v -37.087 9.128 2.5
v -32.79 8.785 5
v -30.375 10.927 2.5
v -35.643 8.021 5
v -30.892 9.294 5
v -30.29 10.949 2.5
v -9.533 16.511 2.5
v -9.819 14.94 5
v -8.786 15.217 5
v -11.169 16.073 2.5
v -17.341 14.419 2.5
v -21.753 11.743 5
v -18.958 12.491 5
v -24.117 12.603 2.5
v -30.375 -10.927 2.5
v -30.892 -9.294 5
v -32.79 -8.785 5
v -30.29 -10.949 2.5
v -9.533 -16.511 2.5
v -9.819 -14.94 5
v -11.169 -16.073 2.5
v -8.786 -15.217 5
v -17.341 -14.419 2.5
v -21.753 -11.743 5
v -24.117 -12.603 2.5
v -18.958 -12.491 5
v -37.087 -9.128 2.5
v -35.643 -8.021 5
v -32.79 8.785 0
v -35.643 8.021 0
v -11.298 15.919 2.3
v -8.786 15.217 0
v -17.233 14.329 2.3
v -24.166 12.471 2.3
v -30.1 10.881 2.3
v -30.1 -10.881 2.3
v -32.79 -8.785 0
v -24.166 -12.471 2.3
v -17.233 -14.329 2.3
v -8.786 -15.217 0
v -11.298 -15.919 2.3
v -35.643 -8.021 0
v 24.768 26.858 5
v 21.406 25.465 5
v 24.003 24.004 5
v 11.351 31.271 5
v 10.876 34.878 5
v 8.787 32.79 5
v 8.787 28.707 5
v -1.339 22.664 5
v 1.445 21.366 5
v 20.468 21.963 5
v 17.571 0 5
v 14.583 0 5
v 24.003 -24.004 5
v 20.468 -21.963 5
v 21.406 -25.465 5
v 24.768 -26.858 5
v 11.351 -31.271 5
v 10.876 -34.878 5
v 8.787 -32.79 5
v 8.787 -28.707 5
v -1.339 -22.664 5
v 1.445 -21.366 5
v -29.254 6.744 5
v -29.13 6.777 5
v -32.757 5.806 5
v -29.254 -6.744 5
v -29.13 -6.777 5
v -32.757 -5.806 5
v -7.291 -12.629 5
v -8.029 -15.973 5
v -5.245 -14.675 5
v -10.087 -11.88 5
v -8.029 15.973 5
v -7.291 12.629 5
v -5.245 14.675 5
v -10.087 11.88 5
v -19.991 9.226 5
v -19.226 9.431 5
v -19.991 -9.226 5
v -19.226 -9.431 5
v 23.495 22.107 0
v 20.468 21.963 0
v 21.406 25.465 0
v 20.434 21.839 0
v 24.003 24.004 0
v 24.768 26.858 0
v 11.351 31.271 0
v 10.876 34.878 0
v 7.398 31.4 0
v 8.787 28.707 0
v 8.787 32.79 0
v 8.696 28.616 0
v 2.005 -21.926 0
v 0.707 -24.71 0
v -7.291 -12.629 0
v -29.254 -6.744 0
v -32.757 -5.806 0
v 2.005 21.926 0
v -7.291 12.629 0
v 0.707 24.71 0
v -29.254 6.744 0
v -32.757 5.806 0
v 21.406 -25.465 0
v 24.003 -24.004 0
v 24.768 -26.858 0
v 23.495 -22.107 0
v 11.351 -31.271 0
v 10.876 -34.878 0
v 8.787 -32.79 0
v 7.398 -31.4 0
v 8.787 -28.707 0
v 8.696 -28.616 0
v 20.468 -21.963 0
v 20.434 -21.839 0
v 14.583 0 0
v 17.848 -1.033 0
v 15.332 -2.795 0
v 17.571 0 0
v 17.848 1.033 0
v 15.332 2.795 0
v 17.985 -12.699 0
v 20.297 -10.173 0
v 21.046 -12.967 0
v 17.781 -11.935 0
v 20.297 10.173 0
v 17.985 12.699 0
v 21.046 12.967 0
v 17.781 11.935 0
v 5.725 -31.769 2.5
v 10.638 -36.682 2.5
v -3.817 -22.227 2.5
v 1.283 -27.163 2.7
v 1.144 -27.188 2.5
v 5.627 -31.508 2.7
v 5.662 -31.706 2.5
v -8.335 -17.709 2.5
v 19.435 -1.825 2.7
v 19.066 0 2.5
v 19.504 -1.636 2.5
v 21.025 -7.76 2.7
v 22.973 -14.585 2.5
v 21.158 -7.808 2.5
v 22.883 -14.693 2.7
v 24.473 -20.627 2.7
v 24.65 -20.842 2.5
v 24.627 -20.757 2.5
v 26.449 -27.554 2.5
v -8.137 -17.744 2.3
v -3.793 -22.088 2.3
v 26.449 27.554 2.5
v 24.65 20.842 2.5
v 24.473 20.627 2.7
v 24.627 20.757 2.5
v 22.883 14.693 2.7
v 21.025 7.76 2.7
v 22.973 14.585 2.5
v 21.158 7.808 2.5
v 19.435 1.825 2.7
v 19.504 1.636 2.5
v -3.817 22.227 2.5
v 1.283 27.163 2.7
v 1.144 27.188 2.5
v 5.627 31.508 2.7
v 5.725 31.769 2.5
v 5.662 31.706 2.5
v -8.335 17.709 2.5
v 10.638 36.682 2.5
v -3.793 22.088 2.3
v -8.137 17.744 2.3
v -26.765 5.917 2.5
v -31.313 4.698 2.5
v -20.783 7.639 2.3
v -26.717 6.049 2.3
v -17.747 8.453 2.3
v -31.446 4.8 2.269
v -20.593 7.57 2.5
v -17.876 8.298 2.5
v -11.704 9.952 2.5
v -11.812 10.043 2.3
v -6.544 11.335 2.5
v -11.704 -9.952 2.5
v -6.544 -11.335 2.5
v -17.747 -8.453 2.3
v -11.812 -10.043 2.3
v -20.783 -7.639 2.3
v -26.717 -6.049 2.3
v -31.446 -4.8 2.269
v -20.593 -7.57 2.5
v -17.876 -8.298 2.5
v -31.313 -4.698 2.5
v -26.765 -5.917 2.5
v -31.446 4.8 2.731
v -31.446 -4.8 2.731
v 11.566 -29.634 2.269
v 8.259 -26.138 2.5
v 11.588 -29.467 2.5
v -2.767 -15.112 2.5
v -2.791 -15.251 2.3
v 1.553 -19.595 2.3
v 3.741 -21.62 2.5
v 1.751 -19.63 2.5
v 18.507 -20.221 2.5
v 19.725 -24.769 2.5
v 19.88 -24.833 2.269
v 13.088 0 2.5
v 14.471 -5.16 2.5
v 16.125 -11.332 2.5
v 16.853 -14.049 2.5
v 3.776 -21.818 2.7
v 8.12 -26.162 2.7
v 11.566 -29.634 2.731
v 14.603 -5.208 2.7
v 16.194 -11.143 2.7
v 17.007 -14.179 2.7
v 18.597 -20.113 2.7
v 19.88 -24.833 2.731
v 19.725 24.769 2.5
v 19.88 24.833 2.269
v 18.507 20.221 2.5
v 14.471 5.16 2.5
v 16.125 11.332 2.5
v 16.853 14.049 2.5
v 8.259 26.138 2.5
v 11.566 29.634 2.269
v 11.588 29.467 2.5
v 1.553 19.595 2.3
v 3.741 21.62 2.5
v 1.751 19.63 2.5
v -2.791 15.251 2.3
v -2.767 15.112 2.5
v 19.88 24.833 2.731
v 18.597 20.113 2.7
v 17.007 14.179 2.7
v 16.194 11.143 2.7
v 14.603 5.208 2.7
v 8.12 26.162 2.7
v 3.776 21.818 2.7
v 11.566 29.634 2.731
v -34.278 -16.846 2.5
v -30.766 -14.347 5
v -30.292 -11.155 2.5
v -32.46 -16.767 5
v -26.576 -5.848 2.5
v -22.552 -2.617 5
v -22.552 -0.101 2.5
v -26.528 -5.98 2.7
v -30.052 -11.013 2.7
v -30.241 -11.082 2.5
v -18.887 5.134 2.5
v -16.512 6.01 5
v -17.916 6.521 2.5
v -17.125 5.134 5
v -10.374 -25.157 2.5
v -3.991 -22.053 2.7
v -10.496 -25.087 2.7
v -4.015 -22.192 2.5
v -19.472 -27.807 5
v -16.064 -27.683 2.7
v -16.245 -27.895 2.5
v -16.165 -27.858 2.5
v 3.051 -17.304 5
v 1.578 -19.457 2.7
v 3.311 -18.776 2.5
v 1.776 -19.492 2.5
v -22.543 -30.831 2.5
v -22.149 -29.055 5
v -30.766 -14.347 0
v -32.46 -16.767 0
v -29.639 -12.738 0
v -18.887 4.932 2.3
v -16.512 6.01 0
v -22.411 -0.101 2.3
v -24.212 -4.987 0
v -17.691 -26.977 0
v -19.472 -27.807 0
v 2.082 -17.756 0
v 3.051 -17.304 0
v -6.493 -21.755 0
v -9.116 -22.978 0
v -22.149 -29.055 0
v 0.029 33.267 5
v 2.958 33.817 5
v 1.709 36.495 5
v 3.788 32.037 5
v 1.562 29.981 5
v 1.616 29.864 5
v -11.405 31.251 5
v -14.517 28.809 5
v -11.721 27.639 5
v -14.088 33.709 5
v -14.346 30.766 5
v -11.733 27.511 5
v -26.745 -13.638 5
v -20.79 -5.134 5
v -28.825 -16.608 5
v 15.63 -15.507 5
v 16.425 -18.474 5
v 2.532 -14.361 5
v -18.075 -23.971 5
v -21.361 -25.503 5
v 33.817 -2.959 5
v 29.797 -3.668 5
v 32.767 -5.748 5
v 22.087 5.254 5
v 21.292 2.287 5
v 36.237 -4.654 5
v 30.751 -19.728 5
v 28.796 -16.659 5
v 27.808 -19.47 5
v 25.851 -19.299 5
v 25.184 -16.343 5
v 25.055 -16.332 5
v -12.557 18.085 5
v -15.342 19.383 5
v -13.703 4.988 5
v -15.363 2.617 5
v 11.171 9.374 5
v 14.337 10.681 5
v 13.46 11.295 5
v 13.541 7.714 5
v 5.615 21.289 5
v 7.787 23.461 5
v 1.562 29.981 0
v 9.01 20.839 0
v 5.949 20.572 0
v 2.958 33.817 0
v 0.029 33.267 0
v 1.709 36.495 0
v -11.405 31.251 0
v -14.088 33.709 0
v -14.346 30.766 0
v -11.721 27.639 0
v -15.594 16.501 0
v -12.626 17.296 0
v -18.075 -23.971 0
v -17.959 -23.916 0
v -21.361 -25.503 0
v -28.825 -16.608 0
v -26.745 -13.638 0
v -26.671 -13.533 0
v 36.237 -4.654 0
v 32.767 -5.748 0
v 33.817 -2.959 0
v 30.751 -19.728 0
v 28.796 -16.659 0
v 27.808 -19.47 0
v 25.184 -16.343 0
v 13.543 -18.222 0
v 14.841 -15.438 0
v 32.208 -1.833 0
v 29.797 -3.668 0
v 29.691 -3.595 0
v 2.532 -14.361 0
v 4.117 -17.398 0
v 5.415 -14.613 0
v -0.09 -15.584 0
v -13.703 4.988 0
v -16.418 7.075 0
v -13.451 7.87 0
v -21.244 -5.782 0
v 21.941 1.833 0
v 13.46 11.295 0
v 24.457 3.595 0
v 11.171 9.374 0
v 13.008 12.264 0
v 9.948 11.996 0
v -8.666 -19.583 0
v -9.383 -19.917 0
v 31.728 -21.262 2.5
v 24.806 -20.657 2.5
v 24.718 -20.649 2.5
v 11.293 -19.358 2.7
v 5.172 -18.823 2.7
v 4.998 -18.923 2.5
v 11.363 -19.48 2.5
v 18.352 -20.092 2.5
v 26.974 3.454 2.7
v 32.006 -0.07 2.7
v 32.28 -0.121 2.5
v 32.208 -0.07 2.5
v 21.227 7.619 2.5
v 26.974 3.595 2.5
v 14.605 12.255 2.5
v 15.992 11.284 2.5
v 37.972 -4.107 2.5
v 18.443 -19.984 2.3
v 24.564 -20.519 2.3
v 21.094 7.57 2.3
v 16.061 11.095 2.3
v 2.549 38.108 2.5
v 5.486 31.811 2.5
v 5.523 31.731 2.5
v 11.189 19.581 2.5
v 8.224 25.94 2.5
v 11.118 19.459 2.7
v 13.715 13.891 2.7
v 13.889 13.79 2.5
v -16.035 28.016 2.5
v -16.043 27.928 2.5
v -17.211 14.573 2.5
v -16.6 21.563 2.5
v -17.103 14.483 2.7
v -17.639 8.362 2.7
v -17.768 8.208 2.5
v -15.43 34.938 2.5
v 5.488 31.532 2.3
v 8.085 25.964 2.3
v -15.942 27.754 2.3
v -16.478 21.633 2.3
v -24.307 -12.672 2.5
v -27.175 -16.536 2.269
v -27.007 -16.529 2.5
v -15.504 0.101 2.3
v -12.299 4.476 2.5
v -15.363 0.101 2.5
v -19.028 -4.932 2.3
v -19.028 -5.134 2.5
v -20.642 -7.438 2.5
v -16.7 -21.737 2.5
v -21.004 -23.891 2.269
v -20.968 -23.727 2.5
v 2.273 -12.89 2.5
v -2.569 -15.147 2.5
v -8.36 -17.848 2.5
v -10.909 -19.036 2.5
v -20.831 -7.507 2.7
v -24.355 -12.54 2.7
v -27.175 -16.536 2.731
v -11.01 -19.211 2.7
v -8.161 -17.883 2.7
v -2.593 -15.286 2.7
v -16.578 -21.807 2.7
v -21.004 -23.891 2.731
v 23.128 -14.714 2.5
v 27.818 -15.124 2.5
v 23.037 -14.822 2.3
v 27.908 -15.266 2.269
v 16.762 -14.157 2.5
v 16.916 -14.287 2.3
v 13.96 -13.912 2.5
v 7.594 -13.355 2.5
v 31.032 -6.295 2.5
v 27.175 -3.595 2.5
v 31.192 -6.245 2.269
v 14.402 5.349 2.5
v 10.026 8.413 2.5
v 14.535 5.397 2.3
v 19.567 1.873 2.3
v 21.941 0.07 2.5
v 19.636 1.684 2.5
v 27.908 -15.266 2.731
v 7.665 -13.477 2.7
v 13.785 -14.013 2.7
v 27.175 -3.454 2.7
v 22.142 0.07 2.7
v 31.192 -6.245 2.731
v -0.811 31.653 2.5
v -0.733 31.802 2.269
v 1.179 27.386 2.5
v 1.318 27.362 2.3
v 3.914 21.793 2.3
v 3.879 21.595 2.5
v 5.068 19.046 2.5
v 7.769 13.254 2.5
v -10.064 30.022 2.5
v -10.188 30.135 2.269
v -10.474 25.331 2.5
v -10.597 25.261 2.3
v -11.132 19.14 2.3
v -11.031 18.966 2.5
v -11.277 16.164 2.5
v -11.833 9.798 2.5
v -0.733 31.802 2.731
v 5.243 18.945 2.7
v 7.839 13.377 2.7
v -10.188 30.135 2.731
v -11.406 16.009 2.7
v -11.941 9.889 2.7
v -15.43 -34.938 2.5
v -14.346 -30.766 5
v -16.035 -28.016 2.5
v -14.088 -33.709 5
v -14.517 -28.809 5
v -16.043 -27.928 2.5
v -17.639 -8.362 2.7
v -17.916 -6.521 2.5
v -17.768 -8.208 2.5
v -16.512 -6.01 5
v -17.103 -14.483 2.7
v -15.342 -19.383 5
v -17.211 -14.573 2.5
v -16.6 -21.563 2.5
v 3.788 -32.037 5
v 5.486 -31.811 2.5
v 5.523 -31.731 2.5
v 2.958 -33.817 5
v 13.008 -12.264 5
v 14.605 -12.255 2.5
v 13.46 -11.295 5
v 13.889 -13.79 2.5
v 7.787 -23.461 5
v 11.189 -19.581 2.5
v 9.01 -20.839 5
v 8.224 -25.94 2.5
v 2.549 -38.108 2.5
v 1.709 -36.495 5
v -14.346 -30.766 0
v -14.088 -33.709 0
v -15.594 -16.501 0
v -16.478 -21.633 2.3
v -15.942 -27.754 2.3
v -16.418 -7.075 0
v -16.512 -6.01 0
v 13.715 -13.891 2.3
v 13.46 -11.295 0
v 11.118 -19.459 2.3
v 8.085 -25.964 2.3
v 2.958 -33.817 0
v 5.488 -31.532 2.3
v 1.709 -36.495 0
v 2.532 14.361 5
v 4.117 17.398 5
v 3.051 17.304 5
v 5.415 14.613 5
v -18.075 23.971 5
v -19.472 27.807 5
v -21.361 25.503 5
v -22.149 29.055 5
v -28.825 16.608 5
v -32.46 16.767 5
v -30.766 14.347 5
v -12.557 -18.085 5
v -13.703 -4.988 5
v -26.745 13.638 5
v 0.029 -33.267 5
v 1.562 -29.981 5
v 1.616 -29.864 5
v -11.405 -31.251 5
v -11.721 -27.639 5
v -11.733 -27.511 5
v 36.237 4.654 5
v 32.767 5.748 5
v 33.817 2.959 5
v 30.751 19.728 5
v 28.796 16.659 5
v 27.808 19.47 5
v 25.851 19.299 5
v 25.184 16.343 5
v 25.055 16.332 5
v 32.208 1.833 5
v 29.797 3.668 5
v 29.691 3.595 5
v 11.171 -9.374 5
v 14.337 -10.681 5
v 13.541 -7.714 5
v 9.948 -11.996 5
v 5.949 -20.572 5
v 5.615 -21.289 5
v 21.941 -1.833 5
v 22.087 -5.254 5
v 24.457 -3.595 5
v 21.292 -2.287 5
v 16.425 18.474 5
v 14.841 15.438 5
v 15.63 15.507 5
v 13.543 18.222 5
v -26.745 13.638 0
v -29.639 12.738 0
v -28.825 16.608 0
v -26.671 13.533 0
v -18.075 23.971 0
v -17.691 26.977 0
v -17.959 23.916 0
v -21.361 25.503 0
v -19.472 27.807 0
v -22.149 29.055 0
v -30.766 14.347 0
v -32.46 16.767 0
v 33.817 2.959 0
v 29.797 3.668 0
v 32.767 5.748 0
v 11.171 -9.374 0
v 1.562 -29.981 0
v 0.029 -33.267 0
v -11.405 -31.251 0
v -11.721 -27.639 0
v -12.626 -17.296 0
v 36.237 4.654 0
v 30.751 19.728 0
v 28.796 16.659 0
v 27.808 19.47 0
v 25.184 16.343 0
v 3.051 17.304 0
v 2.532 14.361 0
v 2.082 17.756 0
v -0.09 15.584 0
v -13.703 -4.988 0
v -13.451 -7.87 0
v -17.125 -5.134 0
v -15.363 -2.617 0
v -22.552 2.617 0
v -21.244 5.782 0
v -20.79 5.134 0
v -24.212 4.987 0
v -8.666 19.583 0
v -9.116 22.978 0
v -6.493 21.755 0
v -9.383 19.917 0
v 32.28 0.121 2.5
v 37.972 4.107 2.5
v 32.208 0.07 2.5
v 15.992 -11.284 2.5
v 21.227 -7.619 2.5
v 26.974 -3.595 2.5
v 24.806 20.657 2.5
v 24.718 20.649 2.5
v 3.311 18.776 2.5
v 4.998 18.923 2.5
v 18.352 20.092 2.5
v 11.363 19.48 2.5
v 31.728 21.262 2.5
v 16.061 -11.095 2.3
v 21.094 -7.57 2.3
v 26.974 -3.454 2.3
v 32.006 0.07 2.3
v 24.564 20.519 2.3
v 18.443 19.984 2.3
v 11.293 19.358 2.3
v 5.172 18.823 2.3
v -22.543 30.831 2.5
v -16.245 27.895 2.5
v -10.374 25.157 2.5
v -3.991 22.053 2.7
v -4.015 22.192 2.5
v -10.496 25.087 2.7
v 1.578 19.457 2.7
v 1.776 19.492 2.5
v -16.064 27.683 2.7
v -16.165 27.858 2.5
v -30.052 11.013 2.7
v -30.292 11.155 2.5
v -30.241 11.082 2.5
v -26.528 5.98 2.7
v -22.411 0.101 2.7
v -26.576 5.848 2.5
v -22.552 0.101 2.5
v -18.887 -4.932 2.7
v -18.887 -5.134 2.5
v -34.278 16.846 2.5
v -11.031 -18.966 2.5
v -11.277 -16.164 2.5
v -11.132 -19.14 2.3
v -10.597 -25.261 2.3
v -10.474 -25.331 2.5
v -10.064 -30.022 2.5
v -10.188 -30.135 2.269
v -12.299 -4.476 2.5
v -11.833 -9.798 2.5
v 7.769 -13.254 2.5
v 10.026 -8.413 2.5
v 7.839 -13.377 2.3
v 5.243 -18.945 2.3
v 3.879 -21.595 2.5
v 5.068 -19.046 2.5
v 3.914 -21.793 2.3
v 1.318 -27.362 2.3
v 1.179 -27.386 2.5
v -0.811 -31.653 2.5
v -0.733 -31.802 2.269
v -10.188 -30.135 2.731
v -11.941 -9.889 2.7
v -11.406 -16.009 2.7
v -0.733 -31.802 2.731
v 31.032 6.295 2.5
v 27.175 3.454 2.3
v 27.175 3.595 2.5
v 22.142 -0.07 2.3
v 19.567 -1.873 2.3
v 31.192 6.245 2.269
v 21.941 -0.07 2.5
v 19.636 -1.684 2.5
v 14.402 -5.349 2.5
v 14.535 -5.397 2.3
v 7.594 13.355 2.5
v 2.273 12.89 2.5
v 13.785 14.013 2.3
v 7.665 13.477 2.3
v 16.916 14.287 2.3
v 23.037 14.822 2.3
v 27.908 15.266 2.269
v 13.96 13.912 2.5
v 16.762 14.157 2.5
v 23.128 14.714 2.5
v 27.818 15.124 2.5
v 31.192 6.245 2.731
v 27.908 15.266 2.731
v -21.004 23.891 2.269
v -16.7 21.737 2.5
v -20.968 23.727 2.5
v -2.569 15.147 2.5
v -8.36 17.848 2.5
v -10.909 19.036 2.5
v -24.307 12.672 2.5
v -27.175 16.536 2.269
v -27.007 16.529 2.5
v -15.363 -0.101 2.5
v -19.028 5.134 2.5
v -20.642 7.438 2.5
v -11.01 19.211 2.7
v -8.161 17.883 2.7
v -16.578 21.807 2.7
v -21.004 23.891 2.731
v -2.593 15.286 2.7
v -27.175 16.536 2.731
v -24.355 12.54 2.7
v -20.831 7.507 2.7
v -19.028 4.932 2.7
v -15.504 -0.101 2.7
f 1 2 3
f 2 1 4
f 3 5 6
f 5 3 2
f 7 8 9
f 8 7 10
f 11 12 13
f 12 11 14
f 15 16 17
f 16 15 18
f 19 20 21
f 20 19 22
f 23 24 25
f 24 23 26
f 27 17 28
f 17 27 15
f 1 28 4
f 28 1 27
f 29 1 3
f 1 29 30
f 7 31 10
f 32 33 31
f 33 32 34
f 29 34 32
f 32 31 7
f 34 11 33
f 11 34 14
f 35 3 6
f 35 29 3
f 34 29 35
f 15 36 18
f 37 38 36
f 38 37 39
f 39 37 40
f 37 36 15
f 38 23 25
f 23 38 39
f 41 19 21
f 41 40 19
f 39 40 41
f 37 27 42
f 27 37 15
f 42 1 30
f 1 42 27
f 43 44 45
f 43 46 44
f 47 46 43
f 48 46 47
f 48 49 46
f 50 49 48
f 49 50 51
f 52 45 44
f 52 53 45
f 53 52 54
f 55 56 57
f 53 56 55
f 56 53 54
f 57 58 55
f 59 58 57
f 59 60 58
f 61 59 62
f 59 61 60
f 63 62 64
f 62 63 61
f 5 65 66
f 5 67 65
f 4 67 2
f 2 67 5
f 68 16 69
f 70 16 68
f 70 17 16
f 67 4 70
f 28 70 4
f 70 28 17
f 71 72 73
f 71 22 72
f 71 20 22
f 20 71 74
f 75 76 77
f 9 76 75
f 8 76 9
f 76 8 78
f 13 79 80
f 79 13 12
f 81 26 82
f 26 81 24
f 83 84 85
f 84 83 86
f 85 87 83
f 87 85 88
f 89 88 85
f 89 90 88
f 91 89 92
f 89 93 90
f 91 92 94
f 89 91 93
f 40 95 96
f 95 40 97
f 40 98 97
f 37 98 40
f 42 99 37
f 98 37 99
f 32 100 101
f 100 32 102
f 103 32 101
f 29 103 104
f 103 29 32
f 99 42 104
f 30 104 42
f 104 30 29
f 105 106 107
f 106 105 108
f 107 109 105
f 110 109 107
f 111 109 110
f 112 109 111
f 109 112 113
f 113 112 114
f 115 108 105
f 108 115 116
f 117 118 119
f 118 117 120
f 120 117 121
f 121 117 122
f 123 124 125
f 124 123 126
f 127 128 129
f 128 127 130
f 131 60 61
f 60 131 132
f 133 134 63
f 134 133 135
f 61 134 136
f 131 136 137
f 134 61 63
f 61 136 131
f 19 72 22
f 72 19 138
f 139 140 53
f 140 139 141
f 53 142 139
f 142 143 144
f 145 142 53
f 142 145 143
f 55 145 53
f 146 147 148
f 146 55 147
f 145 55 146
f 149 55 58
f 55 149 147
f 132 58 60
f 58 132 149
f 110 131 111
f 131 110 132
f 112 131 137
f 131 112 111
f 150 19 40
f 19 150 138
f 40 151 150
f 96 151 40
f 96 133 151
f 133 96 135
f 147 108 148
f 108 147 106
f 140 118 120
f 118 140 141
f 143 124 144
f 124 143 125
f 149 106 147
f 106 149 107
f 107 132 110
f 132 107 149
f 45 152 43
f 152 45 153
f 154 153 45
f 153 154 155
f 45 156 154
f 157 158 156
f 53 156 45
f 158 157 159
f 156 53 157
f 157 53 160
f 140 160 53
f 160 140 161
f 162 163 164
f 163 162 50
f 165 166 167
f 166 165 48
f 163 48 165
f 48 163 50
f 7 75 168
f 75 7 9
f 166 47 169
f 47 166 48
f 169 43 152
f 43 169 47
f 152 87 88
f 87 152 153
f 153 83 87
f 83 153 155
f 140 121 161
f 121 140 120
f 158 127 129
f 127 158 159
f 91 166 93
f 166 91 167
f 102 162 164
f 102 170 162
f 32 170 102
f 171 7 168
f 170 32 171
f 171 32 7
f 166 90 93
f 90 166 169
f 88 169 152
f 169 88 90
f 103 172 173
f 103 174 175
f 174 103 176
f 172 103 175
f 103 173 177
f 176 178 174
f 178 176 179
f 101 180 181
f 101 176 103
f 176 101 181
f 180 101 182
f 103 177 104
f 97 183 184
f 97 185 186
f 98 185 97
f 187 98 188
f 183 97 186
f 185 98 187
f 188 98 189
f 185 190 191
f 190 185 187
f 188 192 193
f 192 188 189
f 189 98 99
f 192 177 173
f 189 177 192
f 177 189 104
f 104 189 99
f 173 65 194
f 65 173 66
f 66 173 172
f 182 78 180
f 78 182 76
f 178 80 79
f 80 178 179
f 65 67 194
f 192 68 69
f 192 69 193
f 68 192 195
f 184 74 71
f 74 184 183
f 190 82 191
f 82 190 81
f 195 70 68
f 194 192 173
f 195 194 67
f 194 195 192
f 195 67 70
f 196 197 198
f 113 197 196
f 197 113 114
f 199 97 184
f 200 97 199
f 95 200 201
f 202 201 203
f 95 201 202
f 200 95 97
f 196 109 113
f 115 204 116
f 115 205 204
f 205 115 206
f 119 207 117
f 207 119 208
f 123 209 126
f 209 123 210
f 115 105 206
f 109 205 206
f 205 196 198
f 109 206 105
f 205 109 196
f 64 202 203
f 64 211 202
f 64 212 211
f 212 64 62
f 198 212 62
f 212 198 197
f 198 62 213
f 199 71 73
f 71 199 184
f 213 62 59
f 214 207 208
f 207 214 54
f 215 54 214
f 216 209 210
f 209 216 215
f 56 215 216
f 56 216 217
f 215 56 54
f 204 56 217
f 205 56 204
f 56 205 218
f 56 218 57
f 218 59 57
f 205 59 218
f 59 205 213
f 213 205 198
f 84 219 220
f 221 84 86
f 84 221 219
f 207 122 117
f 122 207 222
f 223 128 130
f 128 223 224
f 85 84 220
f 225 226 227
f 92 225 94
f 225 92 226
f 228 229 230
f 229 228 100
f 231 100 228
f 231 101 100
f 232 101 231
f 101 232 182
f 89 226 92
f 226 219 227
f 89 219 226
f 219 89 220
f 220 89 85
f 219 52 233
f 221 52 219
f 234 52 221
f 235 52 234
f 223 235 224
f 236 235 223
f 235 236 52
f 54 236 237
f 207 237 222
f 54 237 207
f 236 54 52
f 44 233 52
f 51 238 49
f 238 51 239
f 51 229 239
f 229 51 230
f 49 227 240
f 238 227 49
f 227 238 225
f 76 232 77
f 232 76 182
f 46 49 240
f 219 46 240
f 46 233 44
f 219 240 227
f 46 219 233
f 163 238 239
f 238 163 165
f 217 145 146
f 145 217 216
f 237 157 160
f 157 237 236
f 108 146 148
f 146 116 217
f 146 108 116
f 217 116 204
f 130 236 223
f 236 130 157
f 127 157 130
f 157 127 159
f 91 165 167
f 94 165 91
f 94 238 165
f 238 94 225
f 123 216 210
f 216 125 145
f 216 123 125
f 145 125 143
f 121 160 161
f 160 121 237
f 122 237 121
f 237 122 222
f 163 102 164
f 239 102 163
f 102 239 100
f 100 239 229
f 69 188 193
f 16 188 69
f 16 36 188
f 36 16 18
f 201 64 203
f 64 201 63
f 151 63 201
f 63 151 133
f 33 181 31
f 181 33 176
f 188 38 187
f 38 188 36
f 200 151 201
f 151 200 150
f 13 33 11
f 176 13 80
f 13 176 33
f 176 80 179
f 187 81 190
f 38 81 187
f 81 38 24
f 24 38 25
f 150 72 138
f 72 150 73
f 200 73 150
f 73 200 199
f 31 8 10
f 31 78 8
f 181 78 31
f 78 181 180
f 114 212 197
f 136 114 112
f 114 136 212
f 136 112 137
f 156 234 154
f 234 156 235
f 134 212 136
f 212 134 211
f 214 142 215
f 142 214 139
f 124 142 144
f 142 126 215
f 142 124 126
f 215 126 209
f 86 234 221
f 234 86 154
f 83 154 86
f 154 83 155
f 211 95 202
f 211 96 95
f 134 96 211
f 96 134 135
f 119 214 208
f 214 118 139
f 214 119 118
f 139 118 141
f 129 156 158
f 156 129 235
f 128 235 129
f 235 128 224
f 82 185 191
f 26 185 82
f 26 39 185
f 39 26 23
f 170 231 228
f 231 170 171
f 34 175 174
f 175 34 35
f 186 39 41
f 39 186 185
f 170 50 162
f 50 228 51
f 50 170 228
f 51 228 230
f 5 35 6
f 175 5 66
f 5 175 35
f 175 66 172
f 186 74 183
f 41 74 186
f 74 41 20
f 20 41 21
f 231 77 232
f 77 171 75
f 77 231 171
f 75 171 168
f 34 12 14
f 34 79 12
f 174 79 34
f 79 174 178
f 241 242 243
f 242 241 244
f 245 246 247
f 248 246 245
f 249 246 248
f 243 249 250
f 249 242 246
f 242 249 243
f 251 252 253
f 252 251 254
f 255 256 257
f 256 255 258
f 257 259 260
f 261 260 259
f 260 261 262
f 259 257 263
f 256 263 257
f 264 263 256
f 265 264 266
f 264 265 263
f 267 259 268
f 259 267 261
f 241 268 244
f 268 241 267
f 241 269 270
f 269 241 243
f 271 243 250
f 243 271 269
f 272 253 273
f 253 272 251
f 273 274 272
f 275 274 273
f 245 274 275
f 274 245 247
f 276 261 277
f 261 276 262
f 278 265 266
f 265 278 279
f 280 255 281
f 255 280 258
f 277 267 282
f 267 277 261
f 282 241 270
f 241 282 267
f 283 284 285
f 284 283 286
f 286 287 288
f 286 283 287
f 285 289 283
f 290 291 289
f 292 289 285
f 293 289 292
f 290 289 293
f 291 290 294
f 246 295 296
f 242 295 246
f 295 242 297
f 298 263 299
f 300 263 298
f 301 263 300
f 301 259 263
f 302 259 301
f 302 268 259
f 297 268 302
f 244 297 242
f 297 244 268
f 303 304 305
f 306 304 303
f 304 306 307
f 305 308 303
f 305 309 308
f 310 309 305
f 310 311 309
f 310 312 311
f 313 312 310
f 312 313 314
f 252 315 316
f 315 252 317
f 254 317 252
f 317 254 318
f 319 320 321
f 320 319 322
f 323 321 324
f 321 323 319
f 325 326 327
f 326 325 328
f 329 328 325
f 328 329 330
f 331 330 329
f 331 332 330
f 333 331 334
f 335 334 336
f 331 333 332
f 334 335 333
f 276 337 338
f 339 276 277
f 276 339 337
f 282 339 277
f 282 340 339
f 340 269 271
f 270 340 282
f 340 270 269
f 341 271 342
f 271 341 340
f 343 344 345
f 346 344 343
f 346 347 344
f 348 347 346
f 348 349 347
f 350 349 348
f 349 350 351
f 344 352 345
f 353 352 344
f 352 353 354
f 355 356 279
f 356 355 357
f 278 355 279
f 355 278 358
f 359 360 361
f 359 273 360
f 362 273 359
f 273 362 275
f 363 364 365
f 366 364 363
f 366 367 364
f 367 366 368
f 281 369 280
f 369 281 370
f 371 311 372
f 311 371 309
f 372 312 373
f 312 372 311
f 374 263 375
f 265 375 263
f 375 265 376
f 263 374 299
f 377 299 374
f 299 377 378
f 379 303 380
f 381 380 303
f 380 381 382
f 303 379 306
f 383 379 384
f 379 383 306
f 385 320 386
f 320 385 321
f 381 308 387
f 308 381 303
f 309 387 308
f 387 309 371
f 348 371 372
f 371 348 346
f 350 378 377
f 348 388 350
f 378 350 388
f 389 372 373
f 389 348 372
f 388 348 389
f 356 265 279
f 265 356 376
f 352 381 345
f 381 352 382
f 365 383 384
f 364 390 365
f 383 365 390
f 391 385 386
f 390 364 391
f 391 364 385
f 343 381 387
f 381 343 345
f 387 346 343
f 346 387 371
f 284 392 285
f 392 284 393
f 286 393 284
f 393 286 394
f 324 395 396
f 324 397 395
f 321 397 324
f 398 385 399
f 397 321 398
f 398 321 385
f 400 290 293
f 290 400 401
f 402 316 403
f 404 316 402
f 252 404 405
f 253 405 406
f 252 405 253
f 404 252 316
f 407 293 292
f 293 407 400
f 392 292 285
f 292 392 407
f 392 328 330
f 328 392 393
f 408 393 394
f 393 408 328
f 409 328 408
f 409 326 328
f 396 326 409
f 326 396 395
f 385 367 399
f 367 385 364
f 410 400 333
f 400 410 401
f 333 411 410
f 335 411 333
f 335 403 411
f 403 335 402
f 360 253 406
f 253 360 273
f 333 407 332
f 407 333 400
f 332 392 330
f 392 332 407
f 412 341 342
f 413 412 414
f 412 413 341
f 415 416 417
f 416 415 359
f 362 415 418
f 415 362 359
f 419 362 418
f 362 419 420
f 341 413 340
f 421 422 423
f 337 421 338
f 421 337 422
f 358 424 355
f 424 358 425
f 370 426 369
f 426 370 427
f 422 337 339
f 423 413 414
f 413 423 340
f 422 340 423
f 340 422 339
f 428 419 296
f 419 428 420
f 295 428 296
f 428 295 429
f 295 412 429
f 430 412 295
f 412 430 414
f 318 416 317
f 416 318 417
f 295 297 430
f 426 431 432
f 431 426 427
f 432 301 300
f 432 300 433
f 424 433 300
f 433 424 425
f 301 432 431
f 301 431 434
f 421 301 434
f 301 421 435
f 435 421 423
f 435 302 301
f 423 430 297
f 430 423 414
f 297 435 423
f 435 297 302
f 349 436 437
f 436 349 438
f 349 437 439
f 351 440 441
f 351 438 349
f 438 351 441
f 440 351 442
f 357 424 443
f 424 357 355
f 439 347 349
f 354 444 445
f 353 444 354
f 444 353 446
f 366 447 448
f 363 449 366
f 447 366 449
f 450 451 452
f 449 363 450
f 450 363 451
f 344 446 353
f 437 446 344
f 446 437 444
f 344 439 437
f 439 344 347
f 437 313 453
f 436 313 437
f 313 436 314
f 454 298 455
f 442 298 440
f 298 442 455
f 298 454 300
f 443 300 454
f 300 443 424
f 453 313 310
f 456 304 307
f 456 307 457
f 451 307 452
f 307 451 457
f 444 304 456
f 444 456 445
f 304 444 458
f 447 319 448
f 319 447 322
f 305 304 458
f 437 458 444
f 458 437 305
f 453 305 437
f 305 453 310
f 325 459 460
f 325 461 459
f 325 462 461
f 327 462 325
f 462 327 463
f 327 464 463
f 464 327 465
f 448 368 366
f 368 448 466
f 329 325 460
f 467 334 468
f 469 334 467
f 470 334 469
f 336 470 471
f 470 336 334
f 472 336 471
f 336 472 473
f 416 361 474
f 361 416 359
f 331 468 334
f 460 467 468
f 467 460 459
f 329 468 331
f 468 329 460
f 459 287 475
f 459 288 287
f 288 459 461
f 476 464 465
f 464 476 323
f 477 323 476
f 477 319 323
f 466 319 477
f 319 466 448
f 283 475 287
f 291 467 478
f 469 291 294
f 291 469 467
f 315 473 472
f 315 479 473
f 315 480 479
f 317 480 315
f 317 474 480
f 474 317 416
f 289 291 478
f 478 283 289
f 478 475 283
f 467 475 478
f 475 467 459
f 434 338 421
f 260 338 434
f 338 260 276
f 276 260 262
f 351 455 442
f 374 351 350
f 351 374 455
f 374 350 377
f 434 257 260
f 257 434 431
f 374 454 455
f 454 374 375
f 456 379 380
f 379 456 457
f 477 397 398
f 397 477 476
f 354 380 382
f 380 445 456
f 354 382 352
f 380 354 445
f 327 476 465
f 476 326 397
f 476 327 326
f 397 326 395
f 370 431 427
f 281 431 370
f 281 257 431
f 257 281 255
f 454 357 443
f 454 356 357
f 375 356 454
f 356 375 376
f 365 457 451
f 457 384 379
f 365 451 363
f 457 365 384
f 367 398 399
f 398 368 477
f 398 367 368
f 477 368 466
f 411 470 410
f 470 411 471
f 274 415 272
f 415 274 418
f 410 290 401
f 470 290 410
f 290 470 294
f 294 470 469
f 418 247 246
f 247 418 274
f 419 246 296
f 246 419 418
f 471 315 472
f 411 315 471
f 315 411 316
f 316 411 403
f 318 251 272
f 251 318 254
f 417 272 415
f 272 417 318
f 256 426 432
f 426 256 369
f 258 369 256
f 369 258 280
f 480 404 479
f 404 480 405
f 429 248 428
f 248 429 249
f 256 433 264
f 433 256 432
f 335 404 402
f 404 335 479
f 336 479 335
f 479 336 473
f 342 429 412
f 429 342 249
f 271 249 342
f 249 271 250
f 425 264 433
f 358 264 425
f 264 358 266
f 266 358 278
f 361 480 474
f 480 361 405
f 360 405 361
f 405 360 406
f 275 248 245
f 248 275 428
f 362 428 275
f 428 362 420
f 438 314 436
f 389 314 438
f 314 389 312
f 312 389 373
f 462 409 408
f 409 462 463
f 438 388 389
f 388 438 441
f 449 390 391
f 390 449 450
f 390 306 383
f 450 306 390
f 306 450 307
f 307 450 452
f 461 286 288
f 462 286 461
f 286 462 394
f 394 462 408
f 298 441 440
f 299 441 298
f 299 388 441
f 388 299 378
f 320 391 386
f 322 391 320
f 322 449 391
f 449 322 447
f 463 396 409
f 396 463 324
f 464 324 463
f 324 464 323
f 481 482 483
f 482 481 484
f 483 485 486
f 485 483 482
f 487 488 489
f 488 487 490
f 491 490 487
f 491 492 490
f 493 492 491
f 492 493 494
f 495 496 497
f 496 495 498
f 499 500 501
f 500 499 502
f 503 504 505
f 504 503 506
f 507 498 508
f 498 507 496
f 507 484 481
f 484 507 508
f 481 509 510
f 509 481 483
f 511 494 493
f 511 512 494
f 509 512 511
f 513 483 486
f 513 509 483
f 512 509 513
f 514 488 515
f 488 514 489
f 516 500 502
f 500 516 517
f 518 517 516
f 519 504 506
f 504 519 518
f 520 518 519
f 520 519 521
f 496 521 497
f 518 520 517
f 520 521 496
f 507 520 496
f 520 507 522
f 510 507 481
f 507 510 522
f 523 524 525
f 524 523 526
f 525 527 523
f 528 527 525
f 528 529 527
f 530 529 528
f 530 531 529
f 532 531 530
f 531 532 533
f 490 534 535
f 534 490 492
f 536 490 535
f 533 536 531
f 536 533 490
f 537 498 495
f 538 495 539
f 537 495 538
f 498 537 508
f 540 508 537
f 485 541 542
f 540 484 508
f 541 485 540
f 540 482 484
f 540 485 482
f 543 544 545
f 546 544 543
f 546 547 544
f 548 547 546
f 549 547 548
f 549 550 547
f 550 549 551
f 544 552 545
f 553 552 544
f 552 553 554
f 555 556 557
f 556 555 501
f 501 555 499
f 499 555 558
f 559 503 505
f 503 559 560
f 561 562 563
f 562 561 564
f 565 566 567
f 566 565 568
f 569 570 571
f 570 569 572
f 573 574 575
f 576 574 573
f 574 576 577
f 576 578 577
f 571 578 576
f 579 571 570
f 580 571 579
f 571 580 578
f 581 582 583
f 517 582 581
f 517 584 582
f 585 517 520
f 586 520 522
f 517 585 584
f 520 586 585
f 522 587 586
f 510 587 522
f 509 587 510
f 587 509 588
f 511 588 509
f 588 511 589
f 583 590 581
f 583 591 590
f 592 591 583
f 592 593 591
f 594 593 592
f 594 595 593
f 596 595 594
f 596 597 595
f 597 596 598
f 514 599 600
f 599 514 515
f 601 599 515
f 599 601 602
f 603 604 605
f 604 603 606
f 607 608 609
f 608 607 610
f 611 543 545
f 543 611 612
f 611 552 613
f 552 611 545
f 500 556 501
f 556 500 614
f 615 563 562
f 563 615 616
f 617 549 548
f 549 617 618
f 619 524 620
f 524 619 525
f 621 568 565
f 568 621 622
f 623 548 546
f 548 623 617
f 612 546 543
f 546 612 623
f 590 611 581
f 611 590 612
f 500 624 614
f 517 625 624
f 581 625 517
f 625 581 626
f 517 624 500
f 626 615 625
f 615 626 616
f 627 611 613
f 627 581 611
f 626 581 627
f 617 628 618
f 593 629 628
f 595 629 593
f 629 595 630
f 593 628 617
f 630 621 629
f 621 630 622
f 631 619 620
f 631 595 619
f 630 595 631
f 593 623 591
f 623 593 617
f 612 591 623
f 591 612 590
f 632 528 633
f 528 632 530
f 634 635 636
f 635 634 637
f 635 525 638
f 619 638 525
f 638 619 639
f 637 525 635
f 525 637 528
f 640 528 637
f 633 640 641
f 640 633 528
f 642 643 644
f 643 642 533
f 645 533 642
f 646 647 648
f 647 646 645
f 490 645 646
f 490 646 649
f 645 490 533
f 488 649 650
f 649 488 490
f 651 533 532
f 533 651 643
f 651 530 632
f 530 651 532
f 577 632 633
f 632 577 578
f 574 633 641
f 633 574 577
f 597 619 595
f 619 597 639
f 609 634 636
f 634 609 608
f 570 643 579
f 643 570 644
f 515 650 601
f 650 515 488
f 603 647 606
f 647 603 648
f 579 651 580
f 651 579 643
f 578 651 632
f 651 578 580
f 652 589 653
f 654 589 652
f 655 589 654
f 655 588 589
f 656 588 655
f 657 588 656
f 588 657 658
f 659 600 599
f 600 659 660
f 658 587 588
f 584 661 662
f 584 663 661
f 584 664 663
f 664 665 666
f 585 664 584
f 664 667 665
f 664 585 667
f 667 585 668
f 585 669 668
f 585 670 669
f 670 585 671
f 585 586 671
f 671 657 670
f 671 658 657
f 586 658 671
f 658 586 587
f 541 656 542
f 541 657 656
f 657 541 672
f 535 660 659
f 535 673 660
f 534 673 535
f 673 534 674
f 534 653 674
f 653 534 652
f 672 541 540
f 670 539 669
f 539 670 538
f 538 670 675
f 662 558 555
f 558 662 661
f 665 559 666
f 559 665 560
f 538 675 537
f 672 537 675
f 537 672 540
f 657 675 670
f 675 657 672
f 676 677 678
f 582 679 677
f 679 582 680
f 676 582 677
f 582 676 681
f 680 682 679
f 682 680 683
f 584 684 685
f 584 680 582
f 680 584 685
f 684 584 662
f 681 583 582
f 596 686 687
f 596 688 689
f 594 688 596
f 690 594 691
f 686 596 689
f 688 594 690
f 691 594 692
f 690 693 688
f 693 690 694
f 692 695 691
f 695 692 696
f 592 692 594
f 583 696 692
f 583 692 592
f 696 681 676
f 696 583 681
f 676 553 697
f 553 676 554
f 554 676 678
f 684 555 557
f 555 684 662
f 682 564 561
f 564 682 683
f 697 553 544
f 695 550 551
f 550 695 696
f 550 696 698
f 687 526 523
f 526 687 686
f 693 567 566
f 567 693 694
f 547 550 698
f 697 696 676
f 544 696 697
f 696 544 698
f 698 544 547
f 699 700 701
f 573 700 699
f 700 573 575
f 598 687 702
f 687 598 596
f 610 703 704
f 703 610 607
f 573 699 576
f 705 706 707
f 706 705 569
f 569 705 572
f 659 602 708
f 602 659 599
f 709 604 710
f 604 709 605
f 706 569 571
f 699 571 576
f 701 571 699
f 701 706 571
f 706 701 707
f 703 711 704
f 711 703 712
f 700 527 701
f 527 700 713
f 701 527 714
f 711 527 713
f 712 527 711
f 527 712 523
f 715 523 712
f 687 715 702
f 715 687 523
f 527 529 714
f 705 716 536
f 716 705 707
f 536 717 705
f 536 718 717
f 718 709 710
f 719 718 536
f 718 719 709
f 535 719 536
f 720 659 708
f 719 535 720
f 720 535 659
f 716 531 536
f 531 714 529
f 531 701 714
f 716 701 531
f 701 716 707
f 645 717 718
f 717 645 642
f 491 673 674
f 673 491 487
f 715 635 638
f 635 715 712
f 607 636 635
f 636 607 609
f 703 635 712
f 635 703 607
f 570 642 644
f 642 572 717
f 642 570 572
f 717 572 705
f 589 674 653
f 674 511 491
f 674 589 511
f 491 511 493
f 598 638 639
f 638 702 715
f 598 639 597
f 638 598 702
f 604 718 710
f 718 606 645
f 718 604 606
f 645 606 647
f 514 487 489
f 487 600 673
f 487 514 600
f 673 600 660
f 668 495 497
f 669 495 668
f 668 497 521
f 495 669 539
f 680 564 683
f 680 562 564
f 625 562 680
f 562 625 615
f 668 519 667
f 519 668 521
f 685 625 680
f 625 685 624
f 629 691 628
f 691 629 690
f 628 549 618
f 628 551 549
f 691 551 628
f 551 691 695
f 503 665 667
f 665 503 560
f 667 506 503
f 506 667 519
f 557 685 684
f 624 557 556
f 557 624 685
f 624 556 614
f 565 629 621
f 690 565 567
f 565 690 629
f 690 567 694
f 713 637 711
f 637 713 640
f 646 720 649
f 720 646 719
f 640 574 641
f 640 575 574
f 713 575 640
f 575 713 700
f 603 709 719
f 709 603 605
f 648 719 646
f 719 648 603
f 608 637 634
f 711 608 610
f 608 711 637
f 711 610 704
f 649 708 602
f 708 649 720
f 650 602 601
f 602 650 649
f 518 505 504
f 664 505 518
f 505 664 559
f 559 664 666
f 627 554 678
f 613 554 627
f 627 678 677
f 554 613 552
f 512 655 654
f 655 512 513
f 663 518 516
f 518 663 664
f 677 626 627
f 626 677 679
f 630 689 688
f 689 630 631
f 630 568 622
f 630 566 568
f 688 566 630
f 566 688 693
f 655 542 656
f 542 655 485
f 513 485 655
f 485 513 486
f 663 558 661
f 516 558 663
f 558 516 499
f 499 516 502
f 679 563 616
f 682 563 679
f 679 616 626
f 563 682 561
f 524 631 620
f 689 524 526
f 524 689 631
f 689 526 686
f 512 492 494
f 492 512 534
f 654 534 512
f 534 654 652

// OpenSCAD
// ring puzzle

// Tolerance (vertical gap)
tol=.4;
// Median-ish diameter
L=60;
// Width of of hexagonal cross-section
W=5;
// Angle
phi=60;
// Fraction to cut off points
f=0.43;

translate([0,0,W/2]){
    ring1();
    rotate([0,0,40])ring2();
    rotate([0,0,80])ring3();
}

module wedge(offset=0)
render()
translate([-L,0,0])intersection(){
    rotate([0,0,-45-phi/2])rotate([0,30,0])translate([offset,0,-L/2])cube(L);
    rotate([0,0,-45+phi/2])rotate([-30,0,0])translate([0,offset,-L/2])cube(L);
    translate([L*f,0,0])rotate([0,30,0])translate([offset,-L/2,-L/2])cube(L);
}

module ring(w=W)
render(convexity=4)
difference(){
    for(i=[0:2])rotate([0,0,120*i])intersection(){
        wedge(-w/2);
        mirror([0,0,1])wedge(-w/2);
        cube([2*L,2*L,w],center=true);
    }
    for(i=[0:2])rotate([0,0,120*i]){
        wedge(w/2);
        mirror([0,0,1])wedge(w/2);
    }
}

module cut(i,j,up=1)
intersection(){
    rotate([0,0,40*i])translate([0,0,(W-tol/2)*up])ring(2*W);
    rotate([0,0,60*j+75-40*i])translate([W,W,-L/2])cube(L);
}

module ring1()
render()
difference(){
    ring();
    cut(1,0,-1);
    cut(1,1);
    cut(1,2);
    cut(1,3);
    cut(1,4,-1);
    cut(1,5,-1);
    cut(2,0,-1);
    cut(2,1);
    cut(2,2);
    cut(2,3);
    cut(2,4,-1);
    cut(2,5,-1);
}

module ring2()
render()
difference(){
    ring();
    cut(1,0);
    cut(1,1);
    cut(1,2,-1);
    cut(1,3,-1);
    cut(1,4,-1);
    cut(1,5,-1);
    cut(2,0);
    cut(2,1,-1);
    cut(2,2,-1);
    cut(2,3,-1);
    cut(2,4);
    cut(2,5);
}

module ring3()
render()
difference(){
    ring();
    cut(1,0,-1);
    cut(1,1,-1);
    cut(1,2);
    cut(1,3);
    cut(1,4);
    cut(1,5,-1);
    cut(2,0,-1);
    cut(2,1,-1);
    cut(2,2);
    cut(2,3);
    cut(2,4);
    cut(2,5);
}
